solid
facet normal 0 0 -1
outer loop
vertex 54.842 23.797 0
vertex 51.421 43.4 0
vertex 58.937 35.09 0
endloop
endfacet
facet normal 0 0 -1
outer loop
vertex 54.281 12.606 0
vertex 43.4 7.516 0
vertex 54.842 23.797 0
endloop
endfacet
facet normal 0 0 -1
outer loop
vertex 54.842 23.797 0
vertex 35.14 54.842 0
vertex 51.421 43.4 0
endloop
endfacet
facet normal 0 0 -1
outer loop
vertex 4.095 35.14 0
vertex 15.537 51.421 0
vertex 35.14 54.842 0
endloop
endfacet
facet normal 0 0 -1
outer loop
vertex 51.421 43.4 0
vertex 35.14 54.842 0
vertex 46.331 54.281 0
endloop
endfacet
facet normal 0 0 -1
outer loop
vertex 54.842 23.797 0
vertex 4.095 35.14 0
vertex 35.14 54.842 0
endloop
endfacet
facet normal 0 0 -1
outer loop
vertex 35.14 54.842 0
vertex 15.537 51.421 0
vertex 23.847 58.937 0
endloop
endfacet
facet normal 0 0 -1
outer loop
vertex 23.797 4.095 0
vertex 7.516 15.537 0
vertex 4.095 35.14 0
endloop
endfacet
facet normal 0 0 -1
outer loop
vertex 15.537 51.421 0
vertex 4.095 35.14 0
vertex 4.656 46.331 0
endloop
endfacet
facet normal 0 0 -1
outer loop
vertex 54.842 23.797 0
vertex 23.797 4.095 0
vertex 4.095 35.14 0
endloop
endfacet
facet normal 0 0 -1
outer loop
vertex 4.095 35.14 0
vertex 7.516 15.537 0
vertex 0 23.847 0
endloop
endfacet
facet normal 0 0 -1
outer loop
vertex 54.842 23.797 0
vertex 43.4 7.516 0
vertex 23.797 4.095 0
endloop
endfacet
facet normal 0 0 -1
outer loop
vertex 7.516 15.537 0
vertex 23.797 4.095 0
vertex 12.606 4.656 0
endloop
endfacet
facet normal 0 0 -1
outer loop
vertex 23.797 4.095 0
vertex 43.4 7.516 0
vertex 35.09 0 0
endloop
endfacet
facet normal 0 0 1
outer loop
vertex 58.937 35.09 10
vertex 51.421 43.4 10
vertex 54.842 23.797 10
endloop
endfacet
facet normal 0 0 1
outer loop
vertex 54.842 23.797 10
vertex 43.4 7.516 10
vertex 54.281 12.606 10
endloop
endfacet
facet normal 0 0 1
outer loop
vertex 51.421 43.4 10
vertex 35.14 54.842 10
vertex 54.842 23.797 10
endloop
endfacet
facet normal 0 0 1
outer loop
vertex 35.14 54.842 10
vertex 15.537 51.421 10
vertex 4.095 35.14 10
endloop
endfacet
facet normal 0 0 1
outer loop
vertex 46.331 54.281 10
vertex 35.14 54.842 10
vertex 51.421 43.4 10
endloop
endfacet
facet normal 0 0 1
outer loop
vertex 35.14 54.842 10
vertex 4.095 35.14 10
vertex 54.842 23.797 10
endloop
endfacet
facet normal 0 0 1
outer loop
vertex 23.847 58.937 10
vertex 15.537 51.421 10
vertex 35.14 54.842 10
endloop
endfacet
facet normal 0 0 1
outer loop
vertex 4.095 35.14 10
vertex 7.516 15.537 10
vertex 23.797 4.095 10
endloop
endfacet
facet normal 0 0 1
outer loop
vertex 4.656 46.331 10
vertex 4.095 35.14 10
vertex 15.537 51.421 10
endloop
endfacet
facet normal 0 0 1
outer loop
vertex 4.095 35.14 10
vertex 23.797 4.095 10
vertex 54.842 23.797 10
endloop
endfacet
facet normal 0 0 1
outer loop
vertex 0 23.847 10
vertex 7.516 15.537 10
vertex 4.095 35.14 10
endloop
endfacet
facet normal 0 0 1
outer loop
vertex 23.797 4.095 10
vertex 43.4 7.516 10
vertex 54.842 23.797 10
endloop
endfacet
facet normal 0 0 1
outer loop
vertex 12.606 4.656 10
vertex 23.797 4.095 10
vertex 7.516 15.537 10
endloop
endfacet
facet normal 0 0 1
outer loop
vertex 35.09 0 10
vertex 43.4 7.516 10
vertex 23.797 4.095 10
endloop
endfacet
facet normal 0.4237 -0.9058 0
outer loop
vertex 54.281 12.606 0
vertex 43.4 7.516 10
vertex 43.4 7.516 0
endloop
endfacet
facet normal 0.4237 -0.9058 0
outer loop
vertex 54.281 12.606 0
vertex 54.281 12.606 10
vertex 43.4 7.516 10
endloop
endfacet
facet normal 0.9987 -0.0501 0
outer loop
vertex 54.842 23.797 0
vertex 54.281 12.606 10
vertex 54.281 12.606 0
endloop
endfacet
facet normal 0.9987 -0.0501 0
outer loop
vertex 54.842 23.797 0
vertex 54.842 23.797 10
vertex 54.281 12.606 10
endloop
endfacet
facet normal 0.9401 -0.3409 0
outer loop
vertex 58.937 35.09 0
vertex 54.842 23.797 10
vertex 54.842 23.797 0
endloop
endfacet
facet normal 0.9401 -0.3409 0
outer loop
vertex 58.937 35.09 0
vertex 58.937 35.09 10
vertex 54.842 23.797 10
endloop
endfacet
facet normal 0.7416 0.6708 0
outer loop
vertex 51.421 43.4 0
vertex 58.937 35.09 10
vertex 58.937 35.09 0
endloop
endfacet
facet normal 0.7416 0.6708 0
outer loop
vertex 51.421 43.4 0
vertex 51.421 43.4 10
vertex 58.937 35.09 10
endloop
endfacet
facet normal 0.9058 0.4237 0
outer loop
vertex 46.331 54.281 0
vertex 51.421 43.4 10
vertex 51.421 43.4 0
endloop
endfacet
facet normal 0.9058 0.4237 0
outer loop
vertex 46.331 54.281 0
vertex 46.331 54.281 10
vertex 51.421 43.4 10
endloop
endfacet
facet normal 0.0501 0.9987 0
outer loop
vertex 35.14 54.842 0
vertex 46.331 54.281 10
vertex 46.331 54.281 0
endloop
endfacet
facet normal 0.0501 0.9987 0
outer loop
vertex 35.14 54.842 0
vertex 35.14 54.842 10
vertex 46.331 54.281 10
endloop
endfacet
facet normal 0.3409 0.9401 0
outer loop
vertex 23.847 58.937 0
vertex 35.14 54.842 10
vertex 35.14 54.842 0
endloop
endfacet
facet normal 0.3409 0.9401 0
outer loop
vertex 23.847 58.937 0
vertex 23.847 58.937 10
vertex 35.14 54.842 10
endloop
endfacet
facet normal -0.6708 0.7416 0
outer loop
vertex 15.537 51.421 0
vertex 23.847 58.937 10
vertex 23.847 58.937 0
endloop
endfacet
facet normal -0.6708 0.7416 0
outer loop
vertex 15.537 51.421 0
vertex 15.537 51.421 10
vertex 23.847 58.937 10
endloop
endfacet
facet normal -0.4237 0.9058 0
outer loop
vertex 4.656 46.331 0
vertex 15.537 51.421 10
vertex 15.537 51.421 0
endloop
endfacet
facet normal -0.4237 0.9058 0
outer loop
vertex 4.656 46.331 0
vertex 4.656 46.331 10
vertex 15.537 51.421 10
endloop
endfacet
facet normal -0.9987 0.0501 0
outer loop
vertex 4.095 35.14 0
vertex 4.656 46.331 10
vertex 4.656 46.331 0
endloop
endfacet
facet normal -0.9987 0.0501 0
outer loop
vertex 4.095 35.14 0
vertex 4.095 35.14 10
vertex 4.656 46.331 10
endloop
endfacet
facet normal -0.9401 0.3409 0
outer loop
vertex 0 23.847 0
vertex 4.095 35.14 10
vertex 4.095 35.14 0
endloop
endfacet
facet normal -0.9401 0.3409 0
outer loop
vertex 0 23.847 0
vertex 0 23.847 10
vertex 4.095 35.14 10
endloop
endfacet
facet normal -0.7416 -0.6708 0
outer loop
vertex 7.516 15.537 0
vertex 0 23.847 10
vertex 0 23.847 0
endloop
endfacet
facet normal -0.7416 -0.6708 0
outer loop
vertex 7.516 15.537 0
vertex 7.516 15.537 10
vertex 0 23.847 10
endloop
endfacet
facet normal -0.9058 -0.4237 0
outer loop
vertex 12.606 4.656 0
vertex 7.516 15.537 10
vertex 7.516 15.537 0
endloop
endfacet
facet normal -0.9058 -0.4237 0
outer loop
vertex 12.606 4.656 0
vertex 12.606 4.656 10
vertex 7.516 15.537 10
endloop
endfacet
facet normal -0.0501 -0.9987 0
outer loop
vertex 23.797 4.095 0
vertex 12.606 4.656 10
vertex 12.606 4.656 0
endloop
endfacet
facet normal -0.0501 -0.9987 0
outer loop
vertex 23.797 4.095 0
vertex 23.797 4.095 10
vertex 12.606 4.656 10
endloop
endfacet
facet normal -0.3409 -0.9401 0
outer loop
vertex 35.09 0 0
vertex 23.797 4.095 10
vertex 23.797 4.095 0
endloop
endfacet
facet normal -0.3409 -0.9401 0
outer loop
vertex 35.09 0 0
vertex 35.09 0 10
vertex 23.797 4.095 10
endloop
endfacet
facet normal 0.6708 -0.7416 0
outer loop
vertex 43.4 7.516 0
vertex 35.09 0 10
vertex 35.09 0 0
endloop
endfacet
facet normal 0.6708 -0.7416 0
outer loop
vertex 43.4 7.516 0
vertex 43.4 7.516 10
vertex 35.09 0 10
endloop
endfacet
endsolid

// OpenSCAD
$fn = 32;

// ----------------------------------------------------------------------
// Chain sprocket: 8 teeth, 26 mm root radius
// ----------------------------------------------------------------------

// --- parameters (mm) ---
profile_height = 10;      // extrusion height
profile_points = 16;      // points of the closed outline

profile = [[54.842, 23.797], [58.937, 35.09], [51.421, 43.4], [46.331, 54.281], [35.14, 54.842], [23.847, 58.937], [15.537, 51.421], [4.656, 46.331], [4.095, 35.14], [0, 23.847], [7.516, 15.537], [12.606, 4.656], [23.797, 4.095], [35.09, 0], [43.4, 7.516], [54.281, 12.606]];  // single closed polygon, 16 points, counter clockwise

// --- the one profile operation ---
linear_extrude(height = profile_height) polygon(points = profile);
